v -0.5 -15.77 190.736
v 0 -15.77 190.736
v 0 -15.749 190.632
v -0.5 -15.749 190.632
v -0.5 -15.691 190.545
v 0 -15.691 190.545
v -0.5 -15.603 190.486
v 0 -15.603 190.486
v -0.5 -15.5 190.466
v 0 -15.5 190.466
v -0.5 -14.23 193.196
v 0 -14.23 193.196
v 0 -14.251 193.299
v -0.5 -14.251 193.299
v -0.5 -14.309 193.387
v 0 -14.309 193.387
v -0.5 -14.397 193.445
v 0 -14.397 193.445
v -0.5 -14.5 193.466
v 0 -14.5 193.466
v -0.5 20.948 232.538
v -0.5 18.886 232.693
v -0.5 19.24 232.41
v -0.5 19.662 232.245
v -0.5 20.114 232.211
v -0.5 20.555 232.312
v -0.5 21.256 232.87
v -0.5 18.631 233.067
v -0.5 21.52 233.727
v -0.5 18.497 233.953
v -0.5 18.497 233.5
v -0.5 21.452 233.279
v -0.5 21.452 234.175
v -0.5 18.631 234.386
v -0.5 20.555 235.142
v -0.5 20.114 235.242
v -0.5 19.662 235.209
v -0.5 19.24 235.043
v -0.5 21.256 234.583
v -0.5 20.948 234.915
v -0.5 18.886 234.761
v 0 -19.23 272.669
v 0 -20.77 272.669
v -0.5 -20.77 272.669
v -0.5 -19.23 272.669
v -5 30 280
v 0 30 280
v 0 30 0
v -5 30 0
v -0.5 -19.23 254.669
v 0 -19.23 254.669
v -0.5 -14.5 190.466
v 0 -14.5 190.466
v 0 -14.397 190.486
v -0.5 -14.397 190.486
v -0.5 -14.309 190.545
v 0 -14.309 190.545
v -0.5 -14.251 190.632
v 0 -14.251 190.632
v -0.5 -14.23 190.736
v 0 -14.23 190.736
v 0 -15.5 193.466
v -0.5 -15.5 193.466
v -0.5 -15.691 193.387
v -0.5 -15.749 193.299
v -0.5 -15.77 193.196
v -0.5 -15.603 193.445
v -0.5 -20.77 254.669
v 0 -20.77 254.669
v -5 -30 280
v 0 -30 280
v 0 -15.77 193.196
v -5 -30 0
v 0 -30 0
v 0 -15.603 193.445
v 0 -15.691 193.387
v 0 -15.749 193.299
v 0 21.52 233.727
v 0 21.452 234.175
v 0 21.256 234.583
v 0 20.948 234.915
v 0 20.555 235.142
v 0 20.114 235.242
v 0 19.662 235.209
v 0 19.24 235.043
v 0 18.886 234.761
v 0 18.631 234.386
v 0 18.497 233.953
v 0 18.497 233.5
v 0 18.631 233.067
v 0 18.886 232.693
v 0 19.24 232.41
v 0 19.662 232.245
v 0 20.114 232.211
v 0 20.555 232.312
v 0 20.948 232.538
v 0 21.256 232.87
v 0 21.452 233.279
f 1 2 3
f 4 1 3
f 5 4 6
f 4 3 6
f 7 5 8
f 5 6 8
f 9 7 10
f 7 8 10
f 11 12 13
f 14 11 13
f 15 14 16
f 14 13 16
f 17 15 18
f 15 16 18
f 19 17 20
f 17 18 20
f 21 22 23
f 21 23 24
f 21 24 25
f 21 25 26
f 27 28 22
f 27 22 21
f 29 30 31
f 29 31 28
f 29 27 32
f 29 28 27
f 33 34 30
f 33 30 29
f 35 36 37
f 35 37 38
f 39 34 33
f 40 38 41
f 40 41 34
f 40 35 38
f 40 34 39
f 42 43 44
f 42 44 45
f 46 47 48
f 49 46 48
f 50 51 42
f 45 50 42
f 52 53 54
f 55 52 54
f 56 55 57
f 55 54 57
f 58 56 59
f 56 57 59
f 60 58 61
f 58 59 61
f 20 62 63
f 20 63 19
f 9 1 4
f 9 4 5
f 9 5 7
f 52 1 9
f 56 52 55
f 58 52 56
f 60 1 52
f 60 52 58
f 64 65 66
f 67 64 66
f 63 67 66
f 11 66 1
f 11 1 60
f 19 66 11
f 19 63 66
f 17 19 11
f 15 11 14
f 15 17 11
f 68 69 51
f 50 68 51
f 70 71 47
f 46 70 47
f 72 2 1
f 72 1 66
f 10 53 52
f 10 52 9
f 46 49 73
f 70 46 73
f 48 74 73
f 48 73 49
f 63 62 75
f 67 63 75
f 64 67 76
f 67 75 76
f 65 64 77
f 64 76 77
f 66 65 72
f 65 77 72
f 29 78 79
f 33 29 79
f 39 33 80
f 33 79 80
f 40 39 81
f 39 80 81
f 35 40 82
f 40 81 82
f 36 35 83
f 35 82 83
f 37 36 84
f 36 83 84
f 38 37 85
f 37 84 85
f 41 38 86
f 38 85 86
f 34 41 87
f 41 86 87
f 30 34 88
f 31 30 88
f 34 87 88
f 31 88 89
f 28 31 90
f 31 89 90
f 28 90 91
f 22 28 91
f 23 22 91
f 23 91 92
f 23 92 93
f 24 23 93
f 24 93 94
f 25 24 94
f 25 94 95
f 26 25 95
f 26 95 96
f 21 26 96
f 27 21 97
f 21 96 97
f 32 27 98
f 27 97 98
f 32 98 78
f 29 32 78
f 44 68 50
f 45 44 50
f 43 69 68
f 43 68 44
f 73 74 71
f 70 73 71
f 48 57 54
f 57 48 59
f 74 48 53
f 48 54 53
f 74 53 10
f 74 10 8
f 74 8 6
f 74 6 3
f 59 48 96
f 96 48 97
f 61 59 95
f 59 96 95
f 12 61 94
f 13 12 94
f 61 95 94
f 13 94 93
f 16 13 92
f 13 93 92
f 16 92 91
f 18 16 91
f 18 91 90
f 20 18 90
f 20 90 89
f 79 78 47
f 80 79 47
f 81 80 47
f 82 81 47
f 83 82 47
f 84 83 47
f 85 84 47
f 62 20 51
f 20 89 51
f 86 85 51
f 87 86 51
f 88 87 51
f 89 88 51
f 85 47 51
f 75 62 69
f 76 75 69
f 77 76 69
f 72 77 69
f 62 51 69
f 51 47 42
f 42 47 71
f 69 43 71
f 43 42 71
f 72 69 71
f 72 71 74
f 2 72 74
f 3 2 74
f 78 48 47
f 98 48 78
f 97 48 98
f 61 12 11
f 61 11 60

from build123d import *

# Parameters (mm, degrees)
PAD_DEPTH       = 5
SKETCH001_R     = 1.52
POCKET_DEPTH    = 0.5
SKETCH002_W     = 1.54
SKETCH002_H     = 18
POCKET001_DEPTH = 0.5
POCKET002_DEPTH = 0.5


with BuildPart() as part:
    # Sketch → Pad (new body)
    with BuildSketch(Plane.YZ):
        Polygon((0, 0), (-30, 0), (-30, 280), (30, 280), (30, 0), align=None)
    extrude(amount=-PAD_DEPTH)

    # Sketch001 → Pocket (cut)
    with BuildSketch(Plane.YZ):
        with Locations((20, 233.726693)):
            Circle(SKETCH001_R)
    extrude(amount=-POCKET_DEPTH, mode=Mode.SUBTRACT)

    # Sketch002 → Pocket001 (cut)
    with BuildSketch(Plane.YZ):
        with Locations((-20, 263.669193)):
            Rectangle(SKETCH002_W, SKETCH002_H)
    extrude(amount=-POCKET001_DEPTH, mode=Mode.SUBTRACT)

    # Sketch003 → Pocket002 (cut)
    with BuildSketch(Plane.YZ):
        with BuildLine():
            ThreePointArc((-15.5, 193.465807), (-15.690919, 193.386726), (-15.77, 193.195807))
            Line((-15.77, 190.735807), (-15.77, 193.195807))
            ThreePointArc((-15.77, 190.735807), (-15.690919, 190.544888), (-15.5, 190.465807))
            Line((-14.5, 190.465807), (-15.5, 190.465807))
            ThreePointArc((-14.5, 190.465807), (-14.309081, 190.544888), (-14.23, 190.735807))
            Line((-14.23, 193.195807), (-14.23, 190.735807))
            ThreePointArc((-14.23, 193.195807), (-14.309081, 193.386726), (-14.5, 193.465807))
            Line((-15.5, 193.465807), (-14.5, 193.465807))
        make_face()
    extrude(amount=-POCKET002_DEPTH, mode=Mode.SUBTRACT)


solid = part.part
